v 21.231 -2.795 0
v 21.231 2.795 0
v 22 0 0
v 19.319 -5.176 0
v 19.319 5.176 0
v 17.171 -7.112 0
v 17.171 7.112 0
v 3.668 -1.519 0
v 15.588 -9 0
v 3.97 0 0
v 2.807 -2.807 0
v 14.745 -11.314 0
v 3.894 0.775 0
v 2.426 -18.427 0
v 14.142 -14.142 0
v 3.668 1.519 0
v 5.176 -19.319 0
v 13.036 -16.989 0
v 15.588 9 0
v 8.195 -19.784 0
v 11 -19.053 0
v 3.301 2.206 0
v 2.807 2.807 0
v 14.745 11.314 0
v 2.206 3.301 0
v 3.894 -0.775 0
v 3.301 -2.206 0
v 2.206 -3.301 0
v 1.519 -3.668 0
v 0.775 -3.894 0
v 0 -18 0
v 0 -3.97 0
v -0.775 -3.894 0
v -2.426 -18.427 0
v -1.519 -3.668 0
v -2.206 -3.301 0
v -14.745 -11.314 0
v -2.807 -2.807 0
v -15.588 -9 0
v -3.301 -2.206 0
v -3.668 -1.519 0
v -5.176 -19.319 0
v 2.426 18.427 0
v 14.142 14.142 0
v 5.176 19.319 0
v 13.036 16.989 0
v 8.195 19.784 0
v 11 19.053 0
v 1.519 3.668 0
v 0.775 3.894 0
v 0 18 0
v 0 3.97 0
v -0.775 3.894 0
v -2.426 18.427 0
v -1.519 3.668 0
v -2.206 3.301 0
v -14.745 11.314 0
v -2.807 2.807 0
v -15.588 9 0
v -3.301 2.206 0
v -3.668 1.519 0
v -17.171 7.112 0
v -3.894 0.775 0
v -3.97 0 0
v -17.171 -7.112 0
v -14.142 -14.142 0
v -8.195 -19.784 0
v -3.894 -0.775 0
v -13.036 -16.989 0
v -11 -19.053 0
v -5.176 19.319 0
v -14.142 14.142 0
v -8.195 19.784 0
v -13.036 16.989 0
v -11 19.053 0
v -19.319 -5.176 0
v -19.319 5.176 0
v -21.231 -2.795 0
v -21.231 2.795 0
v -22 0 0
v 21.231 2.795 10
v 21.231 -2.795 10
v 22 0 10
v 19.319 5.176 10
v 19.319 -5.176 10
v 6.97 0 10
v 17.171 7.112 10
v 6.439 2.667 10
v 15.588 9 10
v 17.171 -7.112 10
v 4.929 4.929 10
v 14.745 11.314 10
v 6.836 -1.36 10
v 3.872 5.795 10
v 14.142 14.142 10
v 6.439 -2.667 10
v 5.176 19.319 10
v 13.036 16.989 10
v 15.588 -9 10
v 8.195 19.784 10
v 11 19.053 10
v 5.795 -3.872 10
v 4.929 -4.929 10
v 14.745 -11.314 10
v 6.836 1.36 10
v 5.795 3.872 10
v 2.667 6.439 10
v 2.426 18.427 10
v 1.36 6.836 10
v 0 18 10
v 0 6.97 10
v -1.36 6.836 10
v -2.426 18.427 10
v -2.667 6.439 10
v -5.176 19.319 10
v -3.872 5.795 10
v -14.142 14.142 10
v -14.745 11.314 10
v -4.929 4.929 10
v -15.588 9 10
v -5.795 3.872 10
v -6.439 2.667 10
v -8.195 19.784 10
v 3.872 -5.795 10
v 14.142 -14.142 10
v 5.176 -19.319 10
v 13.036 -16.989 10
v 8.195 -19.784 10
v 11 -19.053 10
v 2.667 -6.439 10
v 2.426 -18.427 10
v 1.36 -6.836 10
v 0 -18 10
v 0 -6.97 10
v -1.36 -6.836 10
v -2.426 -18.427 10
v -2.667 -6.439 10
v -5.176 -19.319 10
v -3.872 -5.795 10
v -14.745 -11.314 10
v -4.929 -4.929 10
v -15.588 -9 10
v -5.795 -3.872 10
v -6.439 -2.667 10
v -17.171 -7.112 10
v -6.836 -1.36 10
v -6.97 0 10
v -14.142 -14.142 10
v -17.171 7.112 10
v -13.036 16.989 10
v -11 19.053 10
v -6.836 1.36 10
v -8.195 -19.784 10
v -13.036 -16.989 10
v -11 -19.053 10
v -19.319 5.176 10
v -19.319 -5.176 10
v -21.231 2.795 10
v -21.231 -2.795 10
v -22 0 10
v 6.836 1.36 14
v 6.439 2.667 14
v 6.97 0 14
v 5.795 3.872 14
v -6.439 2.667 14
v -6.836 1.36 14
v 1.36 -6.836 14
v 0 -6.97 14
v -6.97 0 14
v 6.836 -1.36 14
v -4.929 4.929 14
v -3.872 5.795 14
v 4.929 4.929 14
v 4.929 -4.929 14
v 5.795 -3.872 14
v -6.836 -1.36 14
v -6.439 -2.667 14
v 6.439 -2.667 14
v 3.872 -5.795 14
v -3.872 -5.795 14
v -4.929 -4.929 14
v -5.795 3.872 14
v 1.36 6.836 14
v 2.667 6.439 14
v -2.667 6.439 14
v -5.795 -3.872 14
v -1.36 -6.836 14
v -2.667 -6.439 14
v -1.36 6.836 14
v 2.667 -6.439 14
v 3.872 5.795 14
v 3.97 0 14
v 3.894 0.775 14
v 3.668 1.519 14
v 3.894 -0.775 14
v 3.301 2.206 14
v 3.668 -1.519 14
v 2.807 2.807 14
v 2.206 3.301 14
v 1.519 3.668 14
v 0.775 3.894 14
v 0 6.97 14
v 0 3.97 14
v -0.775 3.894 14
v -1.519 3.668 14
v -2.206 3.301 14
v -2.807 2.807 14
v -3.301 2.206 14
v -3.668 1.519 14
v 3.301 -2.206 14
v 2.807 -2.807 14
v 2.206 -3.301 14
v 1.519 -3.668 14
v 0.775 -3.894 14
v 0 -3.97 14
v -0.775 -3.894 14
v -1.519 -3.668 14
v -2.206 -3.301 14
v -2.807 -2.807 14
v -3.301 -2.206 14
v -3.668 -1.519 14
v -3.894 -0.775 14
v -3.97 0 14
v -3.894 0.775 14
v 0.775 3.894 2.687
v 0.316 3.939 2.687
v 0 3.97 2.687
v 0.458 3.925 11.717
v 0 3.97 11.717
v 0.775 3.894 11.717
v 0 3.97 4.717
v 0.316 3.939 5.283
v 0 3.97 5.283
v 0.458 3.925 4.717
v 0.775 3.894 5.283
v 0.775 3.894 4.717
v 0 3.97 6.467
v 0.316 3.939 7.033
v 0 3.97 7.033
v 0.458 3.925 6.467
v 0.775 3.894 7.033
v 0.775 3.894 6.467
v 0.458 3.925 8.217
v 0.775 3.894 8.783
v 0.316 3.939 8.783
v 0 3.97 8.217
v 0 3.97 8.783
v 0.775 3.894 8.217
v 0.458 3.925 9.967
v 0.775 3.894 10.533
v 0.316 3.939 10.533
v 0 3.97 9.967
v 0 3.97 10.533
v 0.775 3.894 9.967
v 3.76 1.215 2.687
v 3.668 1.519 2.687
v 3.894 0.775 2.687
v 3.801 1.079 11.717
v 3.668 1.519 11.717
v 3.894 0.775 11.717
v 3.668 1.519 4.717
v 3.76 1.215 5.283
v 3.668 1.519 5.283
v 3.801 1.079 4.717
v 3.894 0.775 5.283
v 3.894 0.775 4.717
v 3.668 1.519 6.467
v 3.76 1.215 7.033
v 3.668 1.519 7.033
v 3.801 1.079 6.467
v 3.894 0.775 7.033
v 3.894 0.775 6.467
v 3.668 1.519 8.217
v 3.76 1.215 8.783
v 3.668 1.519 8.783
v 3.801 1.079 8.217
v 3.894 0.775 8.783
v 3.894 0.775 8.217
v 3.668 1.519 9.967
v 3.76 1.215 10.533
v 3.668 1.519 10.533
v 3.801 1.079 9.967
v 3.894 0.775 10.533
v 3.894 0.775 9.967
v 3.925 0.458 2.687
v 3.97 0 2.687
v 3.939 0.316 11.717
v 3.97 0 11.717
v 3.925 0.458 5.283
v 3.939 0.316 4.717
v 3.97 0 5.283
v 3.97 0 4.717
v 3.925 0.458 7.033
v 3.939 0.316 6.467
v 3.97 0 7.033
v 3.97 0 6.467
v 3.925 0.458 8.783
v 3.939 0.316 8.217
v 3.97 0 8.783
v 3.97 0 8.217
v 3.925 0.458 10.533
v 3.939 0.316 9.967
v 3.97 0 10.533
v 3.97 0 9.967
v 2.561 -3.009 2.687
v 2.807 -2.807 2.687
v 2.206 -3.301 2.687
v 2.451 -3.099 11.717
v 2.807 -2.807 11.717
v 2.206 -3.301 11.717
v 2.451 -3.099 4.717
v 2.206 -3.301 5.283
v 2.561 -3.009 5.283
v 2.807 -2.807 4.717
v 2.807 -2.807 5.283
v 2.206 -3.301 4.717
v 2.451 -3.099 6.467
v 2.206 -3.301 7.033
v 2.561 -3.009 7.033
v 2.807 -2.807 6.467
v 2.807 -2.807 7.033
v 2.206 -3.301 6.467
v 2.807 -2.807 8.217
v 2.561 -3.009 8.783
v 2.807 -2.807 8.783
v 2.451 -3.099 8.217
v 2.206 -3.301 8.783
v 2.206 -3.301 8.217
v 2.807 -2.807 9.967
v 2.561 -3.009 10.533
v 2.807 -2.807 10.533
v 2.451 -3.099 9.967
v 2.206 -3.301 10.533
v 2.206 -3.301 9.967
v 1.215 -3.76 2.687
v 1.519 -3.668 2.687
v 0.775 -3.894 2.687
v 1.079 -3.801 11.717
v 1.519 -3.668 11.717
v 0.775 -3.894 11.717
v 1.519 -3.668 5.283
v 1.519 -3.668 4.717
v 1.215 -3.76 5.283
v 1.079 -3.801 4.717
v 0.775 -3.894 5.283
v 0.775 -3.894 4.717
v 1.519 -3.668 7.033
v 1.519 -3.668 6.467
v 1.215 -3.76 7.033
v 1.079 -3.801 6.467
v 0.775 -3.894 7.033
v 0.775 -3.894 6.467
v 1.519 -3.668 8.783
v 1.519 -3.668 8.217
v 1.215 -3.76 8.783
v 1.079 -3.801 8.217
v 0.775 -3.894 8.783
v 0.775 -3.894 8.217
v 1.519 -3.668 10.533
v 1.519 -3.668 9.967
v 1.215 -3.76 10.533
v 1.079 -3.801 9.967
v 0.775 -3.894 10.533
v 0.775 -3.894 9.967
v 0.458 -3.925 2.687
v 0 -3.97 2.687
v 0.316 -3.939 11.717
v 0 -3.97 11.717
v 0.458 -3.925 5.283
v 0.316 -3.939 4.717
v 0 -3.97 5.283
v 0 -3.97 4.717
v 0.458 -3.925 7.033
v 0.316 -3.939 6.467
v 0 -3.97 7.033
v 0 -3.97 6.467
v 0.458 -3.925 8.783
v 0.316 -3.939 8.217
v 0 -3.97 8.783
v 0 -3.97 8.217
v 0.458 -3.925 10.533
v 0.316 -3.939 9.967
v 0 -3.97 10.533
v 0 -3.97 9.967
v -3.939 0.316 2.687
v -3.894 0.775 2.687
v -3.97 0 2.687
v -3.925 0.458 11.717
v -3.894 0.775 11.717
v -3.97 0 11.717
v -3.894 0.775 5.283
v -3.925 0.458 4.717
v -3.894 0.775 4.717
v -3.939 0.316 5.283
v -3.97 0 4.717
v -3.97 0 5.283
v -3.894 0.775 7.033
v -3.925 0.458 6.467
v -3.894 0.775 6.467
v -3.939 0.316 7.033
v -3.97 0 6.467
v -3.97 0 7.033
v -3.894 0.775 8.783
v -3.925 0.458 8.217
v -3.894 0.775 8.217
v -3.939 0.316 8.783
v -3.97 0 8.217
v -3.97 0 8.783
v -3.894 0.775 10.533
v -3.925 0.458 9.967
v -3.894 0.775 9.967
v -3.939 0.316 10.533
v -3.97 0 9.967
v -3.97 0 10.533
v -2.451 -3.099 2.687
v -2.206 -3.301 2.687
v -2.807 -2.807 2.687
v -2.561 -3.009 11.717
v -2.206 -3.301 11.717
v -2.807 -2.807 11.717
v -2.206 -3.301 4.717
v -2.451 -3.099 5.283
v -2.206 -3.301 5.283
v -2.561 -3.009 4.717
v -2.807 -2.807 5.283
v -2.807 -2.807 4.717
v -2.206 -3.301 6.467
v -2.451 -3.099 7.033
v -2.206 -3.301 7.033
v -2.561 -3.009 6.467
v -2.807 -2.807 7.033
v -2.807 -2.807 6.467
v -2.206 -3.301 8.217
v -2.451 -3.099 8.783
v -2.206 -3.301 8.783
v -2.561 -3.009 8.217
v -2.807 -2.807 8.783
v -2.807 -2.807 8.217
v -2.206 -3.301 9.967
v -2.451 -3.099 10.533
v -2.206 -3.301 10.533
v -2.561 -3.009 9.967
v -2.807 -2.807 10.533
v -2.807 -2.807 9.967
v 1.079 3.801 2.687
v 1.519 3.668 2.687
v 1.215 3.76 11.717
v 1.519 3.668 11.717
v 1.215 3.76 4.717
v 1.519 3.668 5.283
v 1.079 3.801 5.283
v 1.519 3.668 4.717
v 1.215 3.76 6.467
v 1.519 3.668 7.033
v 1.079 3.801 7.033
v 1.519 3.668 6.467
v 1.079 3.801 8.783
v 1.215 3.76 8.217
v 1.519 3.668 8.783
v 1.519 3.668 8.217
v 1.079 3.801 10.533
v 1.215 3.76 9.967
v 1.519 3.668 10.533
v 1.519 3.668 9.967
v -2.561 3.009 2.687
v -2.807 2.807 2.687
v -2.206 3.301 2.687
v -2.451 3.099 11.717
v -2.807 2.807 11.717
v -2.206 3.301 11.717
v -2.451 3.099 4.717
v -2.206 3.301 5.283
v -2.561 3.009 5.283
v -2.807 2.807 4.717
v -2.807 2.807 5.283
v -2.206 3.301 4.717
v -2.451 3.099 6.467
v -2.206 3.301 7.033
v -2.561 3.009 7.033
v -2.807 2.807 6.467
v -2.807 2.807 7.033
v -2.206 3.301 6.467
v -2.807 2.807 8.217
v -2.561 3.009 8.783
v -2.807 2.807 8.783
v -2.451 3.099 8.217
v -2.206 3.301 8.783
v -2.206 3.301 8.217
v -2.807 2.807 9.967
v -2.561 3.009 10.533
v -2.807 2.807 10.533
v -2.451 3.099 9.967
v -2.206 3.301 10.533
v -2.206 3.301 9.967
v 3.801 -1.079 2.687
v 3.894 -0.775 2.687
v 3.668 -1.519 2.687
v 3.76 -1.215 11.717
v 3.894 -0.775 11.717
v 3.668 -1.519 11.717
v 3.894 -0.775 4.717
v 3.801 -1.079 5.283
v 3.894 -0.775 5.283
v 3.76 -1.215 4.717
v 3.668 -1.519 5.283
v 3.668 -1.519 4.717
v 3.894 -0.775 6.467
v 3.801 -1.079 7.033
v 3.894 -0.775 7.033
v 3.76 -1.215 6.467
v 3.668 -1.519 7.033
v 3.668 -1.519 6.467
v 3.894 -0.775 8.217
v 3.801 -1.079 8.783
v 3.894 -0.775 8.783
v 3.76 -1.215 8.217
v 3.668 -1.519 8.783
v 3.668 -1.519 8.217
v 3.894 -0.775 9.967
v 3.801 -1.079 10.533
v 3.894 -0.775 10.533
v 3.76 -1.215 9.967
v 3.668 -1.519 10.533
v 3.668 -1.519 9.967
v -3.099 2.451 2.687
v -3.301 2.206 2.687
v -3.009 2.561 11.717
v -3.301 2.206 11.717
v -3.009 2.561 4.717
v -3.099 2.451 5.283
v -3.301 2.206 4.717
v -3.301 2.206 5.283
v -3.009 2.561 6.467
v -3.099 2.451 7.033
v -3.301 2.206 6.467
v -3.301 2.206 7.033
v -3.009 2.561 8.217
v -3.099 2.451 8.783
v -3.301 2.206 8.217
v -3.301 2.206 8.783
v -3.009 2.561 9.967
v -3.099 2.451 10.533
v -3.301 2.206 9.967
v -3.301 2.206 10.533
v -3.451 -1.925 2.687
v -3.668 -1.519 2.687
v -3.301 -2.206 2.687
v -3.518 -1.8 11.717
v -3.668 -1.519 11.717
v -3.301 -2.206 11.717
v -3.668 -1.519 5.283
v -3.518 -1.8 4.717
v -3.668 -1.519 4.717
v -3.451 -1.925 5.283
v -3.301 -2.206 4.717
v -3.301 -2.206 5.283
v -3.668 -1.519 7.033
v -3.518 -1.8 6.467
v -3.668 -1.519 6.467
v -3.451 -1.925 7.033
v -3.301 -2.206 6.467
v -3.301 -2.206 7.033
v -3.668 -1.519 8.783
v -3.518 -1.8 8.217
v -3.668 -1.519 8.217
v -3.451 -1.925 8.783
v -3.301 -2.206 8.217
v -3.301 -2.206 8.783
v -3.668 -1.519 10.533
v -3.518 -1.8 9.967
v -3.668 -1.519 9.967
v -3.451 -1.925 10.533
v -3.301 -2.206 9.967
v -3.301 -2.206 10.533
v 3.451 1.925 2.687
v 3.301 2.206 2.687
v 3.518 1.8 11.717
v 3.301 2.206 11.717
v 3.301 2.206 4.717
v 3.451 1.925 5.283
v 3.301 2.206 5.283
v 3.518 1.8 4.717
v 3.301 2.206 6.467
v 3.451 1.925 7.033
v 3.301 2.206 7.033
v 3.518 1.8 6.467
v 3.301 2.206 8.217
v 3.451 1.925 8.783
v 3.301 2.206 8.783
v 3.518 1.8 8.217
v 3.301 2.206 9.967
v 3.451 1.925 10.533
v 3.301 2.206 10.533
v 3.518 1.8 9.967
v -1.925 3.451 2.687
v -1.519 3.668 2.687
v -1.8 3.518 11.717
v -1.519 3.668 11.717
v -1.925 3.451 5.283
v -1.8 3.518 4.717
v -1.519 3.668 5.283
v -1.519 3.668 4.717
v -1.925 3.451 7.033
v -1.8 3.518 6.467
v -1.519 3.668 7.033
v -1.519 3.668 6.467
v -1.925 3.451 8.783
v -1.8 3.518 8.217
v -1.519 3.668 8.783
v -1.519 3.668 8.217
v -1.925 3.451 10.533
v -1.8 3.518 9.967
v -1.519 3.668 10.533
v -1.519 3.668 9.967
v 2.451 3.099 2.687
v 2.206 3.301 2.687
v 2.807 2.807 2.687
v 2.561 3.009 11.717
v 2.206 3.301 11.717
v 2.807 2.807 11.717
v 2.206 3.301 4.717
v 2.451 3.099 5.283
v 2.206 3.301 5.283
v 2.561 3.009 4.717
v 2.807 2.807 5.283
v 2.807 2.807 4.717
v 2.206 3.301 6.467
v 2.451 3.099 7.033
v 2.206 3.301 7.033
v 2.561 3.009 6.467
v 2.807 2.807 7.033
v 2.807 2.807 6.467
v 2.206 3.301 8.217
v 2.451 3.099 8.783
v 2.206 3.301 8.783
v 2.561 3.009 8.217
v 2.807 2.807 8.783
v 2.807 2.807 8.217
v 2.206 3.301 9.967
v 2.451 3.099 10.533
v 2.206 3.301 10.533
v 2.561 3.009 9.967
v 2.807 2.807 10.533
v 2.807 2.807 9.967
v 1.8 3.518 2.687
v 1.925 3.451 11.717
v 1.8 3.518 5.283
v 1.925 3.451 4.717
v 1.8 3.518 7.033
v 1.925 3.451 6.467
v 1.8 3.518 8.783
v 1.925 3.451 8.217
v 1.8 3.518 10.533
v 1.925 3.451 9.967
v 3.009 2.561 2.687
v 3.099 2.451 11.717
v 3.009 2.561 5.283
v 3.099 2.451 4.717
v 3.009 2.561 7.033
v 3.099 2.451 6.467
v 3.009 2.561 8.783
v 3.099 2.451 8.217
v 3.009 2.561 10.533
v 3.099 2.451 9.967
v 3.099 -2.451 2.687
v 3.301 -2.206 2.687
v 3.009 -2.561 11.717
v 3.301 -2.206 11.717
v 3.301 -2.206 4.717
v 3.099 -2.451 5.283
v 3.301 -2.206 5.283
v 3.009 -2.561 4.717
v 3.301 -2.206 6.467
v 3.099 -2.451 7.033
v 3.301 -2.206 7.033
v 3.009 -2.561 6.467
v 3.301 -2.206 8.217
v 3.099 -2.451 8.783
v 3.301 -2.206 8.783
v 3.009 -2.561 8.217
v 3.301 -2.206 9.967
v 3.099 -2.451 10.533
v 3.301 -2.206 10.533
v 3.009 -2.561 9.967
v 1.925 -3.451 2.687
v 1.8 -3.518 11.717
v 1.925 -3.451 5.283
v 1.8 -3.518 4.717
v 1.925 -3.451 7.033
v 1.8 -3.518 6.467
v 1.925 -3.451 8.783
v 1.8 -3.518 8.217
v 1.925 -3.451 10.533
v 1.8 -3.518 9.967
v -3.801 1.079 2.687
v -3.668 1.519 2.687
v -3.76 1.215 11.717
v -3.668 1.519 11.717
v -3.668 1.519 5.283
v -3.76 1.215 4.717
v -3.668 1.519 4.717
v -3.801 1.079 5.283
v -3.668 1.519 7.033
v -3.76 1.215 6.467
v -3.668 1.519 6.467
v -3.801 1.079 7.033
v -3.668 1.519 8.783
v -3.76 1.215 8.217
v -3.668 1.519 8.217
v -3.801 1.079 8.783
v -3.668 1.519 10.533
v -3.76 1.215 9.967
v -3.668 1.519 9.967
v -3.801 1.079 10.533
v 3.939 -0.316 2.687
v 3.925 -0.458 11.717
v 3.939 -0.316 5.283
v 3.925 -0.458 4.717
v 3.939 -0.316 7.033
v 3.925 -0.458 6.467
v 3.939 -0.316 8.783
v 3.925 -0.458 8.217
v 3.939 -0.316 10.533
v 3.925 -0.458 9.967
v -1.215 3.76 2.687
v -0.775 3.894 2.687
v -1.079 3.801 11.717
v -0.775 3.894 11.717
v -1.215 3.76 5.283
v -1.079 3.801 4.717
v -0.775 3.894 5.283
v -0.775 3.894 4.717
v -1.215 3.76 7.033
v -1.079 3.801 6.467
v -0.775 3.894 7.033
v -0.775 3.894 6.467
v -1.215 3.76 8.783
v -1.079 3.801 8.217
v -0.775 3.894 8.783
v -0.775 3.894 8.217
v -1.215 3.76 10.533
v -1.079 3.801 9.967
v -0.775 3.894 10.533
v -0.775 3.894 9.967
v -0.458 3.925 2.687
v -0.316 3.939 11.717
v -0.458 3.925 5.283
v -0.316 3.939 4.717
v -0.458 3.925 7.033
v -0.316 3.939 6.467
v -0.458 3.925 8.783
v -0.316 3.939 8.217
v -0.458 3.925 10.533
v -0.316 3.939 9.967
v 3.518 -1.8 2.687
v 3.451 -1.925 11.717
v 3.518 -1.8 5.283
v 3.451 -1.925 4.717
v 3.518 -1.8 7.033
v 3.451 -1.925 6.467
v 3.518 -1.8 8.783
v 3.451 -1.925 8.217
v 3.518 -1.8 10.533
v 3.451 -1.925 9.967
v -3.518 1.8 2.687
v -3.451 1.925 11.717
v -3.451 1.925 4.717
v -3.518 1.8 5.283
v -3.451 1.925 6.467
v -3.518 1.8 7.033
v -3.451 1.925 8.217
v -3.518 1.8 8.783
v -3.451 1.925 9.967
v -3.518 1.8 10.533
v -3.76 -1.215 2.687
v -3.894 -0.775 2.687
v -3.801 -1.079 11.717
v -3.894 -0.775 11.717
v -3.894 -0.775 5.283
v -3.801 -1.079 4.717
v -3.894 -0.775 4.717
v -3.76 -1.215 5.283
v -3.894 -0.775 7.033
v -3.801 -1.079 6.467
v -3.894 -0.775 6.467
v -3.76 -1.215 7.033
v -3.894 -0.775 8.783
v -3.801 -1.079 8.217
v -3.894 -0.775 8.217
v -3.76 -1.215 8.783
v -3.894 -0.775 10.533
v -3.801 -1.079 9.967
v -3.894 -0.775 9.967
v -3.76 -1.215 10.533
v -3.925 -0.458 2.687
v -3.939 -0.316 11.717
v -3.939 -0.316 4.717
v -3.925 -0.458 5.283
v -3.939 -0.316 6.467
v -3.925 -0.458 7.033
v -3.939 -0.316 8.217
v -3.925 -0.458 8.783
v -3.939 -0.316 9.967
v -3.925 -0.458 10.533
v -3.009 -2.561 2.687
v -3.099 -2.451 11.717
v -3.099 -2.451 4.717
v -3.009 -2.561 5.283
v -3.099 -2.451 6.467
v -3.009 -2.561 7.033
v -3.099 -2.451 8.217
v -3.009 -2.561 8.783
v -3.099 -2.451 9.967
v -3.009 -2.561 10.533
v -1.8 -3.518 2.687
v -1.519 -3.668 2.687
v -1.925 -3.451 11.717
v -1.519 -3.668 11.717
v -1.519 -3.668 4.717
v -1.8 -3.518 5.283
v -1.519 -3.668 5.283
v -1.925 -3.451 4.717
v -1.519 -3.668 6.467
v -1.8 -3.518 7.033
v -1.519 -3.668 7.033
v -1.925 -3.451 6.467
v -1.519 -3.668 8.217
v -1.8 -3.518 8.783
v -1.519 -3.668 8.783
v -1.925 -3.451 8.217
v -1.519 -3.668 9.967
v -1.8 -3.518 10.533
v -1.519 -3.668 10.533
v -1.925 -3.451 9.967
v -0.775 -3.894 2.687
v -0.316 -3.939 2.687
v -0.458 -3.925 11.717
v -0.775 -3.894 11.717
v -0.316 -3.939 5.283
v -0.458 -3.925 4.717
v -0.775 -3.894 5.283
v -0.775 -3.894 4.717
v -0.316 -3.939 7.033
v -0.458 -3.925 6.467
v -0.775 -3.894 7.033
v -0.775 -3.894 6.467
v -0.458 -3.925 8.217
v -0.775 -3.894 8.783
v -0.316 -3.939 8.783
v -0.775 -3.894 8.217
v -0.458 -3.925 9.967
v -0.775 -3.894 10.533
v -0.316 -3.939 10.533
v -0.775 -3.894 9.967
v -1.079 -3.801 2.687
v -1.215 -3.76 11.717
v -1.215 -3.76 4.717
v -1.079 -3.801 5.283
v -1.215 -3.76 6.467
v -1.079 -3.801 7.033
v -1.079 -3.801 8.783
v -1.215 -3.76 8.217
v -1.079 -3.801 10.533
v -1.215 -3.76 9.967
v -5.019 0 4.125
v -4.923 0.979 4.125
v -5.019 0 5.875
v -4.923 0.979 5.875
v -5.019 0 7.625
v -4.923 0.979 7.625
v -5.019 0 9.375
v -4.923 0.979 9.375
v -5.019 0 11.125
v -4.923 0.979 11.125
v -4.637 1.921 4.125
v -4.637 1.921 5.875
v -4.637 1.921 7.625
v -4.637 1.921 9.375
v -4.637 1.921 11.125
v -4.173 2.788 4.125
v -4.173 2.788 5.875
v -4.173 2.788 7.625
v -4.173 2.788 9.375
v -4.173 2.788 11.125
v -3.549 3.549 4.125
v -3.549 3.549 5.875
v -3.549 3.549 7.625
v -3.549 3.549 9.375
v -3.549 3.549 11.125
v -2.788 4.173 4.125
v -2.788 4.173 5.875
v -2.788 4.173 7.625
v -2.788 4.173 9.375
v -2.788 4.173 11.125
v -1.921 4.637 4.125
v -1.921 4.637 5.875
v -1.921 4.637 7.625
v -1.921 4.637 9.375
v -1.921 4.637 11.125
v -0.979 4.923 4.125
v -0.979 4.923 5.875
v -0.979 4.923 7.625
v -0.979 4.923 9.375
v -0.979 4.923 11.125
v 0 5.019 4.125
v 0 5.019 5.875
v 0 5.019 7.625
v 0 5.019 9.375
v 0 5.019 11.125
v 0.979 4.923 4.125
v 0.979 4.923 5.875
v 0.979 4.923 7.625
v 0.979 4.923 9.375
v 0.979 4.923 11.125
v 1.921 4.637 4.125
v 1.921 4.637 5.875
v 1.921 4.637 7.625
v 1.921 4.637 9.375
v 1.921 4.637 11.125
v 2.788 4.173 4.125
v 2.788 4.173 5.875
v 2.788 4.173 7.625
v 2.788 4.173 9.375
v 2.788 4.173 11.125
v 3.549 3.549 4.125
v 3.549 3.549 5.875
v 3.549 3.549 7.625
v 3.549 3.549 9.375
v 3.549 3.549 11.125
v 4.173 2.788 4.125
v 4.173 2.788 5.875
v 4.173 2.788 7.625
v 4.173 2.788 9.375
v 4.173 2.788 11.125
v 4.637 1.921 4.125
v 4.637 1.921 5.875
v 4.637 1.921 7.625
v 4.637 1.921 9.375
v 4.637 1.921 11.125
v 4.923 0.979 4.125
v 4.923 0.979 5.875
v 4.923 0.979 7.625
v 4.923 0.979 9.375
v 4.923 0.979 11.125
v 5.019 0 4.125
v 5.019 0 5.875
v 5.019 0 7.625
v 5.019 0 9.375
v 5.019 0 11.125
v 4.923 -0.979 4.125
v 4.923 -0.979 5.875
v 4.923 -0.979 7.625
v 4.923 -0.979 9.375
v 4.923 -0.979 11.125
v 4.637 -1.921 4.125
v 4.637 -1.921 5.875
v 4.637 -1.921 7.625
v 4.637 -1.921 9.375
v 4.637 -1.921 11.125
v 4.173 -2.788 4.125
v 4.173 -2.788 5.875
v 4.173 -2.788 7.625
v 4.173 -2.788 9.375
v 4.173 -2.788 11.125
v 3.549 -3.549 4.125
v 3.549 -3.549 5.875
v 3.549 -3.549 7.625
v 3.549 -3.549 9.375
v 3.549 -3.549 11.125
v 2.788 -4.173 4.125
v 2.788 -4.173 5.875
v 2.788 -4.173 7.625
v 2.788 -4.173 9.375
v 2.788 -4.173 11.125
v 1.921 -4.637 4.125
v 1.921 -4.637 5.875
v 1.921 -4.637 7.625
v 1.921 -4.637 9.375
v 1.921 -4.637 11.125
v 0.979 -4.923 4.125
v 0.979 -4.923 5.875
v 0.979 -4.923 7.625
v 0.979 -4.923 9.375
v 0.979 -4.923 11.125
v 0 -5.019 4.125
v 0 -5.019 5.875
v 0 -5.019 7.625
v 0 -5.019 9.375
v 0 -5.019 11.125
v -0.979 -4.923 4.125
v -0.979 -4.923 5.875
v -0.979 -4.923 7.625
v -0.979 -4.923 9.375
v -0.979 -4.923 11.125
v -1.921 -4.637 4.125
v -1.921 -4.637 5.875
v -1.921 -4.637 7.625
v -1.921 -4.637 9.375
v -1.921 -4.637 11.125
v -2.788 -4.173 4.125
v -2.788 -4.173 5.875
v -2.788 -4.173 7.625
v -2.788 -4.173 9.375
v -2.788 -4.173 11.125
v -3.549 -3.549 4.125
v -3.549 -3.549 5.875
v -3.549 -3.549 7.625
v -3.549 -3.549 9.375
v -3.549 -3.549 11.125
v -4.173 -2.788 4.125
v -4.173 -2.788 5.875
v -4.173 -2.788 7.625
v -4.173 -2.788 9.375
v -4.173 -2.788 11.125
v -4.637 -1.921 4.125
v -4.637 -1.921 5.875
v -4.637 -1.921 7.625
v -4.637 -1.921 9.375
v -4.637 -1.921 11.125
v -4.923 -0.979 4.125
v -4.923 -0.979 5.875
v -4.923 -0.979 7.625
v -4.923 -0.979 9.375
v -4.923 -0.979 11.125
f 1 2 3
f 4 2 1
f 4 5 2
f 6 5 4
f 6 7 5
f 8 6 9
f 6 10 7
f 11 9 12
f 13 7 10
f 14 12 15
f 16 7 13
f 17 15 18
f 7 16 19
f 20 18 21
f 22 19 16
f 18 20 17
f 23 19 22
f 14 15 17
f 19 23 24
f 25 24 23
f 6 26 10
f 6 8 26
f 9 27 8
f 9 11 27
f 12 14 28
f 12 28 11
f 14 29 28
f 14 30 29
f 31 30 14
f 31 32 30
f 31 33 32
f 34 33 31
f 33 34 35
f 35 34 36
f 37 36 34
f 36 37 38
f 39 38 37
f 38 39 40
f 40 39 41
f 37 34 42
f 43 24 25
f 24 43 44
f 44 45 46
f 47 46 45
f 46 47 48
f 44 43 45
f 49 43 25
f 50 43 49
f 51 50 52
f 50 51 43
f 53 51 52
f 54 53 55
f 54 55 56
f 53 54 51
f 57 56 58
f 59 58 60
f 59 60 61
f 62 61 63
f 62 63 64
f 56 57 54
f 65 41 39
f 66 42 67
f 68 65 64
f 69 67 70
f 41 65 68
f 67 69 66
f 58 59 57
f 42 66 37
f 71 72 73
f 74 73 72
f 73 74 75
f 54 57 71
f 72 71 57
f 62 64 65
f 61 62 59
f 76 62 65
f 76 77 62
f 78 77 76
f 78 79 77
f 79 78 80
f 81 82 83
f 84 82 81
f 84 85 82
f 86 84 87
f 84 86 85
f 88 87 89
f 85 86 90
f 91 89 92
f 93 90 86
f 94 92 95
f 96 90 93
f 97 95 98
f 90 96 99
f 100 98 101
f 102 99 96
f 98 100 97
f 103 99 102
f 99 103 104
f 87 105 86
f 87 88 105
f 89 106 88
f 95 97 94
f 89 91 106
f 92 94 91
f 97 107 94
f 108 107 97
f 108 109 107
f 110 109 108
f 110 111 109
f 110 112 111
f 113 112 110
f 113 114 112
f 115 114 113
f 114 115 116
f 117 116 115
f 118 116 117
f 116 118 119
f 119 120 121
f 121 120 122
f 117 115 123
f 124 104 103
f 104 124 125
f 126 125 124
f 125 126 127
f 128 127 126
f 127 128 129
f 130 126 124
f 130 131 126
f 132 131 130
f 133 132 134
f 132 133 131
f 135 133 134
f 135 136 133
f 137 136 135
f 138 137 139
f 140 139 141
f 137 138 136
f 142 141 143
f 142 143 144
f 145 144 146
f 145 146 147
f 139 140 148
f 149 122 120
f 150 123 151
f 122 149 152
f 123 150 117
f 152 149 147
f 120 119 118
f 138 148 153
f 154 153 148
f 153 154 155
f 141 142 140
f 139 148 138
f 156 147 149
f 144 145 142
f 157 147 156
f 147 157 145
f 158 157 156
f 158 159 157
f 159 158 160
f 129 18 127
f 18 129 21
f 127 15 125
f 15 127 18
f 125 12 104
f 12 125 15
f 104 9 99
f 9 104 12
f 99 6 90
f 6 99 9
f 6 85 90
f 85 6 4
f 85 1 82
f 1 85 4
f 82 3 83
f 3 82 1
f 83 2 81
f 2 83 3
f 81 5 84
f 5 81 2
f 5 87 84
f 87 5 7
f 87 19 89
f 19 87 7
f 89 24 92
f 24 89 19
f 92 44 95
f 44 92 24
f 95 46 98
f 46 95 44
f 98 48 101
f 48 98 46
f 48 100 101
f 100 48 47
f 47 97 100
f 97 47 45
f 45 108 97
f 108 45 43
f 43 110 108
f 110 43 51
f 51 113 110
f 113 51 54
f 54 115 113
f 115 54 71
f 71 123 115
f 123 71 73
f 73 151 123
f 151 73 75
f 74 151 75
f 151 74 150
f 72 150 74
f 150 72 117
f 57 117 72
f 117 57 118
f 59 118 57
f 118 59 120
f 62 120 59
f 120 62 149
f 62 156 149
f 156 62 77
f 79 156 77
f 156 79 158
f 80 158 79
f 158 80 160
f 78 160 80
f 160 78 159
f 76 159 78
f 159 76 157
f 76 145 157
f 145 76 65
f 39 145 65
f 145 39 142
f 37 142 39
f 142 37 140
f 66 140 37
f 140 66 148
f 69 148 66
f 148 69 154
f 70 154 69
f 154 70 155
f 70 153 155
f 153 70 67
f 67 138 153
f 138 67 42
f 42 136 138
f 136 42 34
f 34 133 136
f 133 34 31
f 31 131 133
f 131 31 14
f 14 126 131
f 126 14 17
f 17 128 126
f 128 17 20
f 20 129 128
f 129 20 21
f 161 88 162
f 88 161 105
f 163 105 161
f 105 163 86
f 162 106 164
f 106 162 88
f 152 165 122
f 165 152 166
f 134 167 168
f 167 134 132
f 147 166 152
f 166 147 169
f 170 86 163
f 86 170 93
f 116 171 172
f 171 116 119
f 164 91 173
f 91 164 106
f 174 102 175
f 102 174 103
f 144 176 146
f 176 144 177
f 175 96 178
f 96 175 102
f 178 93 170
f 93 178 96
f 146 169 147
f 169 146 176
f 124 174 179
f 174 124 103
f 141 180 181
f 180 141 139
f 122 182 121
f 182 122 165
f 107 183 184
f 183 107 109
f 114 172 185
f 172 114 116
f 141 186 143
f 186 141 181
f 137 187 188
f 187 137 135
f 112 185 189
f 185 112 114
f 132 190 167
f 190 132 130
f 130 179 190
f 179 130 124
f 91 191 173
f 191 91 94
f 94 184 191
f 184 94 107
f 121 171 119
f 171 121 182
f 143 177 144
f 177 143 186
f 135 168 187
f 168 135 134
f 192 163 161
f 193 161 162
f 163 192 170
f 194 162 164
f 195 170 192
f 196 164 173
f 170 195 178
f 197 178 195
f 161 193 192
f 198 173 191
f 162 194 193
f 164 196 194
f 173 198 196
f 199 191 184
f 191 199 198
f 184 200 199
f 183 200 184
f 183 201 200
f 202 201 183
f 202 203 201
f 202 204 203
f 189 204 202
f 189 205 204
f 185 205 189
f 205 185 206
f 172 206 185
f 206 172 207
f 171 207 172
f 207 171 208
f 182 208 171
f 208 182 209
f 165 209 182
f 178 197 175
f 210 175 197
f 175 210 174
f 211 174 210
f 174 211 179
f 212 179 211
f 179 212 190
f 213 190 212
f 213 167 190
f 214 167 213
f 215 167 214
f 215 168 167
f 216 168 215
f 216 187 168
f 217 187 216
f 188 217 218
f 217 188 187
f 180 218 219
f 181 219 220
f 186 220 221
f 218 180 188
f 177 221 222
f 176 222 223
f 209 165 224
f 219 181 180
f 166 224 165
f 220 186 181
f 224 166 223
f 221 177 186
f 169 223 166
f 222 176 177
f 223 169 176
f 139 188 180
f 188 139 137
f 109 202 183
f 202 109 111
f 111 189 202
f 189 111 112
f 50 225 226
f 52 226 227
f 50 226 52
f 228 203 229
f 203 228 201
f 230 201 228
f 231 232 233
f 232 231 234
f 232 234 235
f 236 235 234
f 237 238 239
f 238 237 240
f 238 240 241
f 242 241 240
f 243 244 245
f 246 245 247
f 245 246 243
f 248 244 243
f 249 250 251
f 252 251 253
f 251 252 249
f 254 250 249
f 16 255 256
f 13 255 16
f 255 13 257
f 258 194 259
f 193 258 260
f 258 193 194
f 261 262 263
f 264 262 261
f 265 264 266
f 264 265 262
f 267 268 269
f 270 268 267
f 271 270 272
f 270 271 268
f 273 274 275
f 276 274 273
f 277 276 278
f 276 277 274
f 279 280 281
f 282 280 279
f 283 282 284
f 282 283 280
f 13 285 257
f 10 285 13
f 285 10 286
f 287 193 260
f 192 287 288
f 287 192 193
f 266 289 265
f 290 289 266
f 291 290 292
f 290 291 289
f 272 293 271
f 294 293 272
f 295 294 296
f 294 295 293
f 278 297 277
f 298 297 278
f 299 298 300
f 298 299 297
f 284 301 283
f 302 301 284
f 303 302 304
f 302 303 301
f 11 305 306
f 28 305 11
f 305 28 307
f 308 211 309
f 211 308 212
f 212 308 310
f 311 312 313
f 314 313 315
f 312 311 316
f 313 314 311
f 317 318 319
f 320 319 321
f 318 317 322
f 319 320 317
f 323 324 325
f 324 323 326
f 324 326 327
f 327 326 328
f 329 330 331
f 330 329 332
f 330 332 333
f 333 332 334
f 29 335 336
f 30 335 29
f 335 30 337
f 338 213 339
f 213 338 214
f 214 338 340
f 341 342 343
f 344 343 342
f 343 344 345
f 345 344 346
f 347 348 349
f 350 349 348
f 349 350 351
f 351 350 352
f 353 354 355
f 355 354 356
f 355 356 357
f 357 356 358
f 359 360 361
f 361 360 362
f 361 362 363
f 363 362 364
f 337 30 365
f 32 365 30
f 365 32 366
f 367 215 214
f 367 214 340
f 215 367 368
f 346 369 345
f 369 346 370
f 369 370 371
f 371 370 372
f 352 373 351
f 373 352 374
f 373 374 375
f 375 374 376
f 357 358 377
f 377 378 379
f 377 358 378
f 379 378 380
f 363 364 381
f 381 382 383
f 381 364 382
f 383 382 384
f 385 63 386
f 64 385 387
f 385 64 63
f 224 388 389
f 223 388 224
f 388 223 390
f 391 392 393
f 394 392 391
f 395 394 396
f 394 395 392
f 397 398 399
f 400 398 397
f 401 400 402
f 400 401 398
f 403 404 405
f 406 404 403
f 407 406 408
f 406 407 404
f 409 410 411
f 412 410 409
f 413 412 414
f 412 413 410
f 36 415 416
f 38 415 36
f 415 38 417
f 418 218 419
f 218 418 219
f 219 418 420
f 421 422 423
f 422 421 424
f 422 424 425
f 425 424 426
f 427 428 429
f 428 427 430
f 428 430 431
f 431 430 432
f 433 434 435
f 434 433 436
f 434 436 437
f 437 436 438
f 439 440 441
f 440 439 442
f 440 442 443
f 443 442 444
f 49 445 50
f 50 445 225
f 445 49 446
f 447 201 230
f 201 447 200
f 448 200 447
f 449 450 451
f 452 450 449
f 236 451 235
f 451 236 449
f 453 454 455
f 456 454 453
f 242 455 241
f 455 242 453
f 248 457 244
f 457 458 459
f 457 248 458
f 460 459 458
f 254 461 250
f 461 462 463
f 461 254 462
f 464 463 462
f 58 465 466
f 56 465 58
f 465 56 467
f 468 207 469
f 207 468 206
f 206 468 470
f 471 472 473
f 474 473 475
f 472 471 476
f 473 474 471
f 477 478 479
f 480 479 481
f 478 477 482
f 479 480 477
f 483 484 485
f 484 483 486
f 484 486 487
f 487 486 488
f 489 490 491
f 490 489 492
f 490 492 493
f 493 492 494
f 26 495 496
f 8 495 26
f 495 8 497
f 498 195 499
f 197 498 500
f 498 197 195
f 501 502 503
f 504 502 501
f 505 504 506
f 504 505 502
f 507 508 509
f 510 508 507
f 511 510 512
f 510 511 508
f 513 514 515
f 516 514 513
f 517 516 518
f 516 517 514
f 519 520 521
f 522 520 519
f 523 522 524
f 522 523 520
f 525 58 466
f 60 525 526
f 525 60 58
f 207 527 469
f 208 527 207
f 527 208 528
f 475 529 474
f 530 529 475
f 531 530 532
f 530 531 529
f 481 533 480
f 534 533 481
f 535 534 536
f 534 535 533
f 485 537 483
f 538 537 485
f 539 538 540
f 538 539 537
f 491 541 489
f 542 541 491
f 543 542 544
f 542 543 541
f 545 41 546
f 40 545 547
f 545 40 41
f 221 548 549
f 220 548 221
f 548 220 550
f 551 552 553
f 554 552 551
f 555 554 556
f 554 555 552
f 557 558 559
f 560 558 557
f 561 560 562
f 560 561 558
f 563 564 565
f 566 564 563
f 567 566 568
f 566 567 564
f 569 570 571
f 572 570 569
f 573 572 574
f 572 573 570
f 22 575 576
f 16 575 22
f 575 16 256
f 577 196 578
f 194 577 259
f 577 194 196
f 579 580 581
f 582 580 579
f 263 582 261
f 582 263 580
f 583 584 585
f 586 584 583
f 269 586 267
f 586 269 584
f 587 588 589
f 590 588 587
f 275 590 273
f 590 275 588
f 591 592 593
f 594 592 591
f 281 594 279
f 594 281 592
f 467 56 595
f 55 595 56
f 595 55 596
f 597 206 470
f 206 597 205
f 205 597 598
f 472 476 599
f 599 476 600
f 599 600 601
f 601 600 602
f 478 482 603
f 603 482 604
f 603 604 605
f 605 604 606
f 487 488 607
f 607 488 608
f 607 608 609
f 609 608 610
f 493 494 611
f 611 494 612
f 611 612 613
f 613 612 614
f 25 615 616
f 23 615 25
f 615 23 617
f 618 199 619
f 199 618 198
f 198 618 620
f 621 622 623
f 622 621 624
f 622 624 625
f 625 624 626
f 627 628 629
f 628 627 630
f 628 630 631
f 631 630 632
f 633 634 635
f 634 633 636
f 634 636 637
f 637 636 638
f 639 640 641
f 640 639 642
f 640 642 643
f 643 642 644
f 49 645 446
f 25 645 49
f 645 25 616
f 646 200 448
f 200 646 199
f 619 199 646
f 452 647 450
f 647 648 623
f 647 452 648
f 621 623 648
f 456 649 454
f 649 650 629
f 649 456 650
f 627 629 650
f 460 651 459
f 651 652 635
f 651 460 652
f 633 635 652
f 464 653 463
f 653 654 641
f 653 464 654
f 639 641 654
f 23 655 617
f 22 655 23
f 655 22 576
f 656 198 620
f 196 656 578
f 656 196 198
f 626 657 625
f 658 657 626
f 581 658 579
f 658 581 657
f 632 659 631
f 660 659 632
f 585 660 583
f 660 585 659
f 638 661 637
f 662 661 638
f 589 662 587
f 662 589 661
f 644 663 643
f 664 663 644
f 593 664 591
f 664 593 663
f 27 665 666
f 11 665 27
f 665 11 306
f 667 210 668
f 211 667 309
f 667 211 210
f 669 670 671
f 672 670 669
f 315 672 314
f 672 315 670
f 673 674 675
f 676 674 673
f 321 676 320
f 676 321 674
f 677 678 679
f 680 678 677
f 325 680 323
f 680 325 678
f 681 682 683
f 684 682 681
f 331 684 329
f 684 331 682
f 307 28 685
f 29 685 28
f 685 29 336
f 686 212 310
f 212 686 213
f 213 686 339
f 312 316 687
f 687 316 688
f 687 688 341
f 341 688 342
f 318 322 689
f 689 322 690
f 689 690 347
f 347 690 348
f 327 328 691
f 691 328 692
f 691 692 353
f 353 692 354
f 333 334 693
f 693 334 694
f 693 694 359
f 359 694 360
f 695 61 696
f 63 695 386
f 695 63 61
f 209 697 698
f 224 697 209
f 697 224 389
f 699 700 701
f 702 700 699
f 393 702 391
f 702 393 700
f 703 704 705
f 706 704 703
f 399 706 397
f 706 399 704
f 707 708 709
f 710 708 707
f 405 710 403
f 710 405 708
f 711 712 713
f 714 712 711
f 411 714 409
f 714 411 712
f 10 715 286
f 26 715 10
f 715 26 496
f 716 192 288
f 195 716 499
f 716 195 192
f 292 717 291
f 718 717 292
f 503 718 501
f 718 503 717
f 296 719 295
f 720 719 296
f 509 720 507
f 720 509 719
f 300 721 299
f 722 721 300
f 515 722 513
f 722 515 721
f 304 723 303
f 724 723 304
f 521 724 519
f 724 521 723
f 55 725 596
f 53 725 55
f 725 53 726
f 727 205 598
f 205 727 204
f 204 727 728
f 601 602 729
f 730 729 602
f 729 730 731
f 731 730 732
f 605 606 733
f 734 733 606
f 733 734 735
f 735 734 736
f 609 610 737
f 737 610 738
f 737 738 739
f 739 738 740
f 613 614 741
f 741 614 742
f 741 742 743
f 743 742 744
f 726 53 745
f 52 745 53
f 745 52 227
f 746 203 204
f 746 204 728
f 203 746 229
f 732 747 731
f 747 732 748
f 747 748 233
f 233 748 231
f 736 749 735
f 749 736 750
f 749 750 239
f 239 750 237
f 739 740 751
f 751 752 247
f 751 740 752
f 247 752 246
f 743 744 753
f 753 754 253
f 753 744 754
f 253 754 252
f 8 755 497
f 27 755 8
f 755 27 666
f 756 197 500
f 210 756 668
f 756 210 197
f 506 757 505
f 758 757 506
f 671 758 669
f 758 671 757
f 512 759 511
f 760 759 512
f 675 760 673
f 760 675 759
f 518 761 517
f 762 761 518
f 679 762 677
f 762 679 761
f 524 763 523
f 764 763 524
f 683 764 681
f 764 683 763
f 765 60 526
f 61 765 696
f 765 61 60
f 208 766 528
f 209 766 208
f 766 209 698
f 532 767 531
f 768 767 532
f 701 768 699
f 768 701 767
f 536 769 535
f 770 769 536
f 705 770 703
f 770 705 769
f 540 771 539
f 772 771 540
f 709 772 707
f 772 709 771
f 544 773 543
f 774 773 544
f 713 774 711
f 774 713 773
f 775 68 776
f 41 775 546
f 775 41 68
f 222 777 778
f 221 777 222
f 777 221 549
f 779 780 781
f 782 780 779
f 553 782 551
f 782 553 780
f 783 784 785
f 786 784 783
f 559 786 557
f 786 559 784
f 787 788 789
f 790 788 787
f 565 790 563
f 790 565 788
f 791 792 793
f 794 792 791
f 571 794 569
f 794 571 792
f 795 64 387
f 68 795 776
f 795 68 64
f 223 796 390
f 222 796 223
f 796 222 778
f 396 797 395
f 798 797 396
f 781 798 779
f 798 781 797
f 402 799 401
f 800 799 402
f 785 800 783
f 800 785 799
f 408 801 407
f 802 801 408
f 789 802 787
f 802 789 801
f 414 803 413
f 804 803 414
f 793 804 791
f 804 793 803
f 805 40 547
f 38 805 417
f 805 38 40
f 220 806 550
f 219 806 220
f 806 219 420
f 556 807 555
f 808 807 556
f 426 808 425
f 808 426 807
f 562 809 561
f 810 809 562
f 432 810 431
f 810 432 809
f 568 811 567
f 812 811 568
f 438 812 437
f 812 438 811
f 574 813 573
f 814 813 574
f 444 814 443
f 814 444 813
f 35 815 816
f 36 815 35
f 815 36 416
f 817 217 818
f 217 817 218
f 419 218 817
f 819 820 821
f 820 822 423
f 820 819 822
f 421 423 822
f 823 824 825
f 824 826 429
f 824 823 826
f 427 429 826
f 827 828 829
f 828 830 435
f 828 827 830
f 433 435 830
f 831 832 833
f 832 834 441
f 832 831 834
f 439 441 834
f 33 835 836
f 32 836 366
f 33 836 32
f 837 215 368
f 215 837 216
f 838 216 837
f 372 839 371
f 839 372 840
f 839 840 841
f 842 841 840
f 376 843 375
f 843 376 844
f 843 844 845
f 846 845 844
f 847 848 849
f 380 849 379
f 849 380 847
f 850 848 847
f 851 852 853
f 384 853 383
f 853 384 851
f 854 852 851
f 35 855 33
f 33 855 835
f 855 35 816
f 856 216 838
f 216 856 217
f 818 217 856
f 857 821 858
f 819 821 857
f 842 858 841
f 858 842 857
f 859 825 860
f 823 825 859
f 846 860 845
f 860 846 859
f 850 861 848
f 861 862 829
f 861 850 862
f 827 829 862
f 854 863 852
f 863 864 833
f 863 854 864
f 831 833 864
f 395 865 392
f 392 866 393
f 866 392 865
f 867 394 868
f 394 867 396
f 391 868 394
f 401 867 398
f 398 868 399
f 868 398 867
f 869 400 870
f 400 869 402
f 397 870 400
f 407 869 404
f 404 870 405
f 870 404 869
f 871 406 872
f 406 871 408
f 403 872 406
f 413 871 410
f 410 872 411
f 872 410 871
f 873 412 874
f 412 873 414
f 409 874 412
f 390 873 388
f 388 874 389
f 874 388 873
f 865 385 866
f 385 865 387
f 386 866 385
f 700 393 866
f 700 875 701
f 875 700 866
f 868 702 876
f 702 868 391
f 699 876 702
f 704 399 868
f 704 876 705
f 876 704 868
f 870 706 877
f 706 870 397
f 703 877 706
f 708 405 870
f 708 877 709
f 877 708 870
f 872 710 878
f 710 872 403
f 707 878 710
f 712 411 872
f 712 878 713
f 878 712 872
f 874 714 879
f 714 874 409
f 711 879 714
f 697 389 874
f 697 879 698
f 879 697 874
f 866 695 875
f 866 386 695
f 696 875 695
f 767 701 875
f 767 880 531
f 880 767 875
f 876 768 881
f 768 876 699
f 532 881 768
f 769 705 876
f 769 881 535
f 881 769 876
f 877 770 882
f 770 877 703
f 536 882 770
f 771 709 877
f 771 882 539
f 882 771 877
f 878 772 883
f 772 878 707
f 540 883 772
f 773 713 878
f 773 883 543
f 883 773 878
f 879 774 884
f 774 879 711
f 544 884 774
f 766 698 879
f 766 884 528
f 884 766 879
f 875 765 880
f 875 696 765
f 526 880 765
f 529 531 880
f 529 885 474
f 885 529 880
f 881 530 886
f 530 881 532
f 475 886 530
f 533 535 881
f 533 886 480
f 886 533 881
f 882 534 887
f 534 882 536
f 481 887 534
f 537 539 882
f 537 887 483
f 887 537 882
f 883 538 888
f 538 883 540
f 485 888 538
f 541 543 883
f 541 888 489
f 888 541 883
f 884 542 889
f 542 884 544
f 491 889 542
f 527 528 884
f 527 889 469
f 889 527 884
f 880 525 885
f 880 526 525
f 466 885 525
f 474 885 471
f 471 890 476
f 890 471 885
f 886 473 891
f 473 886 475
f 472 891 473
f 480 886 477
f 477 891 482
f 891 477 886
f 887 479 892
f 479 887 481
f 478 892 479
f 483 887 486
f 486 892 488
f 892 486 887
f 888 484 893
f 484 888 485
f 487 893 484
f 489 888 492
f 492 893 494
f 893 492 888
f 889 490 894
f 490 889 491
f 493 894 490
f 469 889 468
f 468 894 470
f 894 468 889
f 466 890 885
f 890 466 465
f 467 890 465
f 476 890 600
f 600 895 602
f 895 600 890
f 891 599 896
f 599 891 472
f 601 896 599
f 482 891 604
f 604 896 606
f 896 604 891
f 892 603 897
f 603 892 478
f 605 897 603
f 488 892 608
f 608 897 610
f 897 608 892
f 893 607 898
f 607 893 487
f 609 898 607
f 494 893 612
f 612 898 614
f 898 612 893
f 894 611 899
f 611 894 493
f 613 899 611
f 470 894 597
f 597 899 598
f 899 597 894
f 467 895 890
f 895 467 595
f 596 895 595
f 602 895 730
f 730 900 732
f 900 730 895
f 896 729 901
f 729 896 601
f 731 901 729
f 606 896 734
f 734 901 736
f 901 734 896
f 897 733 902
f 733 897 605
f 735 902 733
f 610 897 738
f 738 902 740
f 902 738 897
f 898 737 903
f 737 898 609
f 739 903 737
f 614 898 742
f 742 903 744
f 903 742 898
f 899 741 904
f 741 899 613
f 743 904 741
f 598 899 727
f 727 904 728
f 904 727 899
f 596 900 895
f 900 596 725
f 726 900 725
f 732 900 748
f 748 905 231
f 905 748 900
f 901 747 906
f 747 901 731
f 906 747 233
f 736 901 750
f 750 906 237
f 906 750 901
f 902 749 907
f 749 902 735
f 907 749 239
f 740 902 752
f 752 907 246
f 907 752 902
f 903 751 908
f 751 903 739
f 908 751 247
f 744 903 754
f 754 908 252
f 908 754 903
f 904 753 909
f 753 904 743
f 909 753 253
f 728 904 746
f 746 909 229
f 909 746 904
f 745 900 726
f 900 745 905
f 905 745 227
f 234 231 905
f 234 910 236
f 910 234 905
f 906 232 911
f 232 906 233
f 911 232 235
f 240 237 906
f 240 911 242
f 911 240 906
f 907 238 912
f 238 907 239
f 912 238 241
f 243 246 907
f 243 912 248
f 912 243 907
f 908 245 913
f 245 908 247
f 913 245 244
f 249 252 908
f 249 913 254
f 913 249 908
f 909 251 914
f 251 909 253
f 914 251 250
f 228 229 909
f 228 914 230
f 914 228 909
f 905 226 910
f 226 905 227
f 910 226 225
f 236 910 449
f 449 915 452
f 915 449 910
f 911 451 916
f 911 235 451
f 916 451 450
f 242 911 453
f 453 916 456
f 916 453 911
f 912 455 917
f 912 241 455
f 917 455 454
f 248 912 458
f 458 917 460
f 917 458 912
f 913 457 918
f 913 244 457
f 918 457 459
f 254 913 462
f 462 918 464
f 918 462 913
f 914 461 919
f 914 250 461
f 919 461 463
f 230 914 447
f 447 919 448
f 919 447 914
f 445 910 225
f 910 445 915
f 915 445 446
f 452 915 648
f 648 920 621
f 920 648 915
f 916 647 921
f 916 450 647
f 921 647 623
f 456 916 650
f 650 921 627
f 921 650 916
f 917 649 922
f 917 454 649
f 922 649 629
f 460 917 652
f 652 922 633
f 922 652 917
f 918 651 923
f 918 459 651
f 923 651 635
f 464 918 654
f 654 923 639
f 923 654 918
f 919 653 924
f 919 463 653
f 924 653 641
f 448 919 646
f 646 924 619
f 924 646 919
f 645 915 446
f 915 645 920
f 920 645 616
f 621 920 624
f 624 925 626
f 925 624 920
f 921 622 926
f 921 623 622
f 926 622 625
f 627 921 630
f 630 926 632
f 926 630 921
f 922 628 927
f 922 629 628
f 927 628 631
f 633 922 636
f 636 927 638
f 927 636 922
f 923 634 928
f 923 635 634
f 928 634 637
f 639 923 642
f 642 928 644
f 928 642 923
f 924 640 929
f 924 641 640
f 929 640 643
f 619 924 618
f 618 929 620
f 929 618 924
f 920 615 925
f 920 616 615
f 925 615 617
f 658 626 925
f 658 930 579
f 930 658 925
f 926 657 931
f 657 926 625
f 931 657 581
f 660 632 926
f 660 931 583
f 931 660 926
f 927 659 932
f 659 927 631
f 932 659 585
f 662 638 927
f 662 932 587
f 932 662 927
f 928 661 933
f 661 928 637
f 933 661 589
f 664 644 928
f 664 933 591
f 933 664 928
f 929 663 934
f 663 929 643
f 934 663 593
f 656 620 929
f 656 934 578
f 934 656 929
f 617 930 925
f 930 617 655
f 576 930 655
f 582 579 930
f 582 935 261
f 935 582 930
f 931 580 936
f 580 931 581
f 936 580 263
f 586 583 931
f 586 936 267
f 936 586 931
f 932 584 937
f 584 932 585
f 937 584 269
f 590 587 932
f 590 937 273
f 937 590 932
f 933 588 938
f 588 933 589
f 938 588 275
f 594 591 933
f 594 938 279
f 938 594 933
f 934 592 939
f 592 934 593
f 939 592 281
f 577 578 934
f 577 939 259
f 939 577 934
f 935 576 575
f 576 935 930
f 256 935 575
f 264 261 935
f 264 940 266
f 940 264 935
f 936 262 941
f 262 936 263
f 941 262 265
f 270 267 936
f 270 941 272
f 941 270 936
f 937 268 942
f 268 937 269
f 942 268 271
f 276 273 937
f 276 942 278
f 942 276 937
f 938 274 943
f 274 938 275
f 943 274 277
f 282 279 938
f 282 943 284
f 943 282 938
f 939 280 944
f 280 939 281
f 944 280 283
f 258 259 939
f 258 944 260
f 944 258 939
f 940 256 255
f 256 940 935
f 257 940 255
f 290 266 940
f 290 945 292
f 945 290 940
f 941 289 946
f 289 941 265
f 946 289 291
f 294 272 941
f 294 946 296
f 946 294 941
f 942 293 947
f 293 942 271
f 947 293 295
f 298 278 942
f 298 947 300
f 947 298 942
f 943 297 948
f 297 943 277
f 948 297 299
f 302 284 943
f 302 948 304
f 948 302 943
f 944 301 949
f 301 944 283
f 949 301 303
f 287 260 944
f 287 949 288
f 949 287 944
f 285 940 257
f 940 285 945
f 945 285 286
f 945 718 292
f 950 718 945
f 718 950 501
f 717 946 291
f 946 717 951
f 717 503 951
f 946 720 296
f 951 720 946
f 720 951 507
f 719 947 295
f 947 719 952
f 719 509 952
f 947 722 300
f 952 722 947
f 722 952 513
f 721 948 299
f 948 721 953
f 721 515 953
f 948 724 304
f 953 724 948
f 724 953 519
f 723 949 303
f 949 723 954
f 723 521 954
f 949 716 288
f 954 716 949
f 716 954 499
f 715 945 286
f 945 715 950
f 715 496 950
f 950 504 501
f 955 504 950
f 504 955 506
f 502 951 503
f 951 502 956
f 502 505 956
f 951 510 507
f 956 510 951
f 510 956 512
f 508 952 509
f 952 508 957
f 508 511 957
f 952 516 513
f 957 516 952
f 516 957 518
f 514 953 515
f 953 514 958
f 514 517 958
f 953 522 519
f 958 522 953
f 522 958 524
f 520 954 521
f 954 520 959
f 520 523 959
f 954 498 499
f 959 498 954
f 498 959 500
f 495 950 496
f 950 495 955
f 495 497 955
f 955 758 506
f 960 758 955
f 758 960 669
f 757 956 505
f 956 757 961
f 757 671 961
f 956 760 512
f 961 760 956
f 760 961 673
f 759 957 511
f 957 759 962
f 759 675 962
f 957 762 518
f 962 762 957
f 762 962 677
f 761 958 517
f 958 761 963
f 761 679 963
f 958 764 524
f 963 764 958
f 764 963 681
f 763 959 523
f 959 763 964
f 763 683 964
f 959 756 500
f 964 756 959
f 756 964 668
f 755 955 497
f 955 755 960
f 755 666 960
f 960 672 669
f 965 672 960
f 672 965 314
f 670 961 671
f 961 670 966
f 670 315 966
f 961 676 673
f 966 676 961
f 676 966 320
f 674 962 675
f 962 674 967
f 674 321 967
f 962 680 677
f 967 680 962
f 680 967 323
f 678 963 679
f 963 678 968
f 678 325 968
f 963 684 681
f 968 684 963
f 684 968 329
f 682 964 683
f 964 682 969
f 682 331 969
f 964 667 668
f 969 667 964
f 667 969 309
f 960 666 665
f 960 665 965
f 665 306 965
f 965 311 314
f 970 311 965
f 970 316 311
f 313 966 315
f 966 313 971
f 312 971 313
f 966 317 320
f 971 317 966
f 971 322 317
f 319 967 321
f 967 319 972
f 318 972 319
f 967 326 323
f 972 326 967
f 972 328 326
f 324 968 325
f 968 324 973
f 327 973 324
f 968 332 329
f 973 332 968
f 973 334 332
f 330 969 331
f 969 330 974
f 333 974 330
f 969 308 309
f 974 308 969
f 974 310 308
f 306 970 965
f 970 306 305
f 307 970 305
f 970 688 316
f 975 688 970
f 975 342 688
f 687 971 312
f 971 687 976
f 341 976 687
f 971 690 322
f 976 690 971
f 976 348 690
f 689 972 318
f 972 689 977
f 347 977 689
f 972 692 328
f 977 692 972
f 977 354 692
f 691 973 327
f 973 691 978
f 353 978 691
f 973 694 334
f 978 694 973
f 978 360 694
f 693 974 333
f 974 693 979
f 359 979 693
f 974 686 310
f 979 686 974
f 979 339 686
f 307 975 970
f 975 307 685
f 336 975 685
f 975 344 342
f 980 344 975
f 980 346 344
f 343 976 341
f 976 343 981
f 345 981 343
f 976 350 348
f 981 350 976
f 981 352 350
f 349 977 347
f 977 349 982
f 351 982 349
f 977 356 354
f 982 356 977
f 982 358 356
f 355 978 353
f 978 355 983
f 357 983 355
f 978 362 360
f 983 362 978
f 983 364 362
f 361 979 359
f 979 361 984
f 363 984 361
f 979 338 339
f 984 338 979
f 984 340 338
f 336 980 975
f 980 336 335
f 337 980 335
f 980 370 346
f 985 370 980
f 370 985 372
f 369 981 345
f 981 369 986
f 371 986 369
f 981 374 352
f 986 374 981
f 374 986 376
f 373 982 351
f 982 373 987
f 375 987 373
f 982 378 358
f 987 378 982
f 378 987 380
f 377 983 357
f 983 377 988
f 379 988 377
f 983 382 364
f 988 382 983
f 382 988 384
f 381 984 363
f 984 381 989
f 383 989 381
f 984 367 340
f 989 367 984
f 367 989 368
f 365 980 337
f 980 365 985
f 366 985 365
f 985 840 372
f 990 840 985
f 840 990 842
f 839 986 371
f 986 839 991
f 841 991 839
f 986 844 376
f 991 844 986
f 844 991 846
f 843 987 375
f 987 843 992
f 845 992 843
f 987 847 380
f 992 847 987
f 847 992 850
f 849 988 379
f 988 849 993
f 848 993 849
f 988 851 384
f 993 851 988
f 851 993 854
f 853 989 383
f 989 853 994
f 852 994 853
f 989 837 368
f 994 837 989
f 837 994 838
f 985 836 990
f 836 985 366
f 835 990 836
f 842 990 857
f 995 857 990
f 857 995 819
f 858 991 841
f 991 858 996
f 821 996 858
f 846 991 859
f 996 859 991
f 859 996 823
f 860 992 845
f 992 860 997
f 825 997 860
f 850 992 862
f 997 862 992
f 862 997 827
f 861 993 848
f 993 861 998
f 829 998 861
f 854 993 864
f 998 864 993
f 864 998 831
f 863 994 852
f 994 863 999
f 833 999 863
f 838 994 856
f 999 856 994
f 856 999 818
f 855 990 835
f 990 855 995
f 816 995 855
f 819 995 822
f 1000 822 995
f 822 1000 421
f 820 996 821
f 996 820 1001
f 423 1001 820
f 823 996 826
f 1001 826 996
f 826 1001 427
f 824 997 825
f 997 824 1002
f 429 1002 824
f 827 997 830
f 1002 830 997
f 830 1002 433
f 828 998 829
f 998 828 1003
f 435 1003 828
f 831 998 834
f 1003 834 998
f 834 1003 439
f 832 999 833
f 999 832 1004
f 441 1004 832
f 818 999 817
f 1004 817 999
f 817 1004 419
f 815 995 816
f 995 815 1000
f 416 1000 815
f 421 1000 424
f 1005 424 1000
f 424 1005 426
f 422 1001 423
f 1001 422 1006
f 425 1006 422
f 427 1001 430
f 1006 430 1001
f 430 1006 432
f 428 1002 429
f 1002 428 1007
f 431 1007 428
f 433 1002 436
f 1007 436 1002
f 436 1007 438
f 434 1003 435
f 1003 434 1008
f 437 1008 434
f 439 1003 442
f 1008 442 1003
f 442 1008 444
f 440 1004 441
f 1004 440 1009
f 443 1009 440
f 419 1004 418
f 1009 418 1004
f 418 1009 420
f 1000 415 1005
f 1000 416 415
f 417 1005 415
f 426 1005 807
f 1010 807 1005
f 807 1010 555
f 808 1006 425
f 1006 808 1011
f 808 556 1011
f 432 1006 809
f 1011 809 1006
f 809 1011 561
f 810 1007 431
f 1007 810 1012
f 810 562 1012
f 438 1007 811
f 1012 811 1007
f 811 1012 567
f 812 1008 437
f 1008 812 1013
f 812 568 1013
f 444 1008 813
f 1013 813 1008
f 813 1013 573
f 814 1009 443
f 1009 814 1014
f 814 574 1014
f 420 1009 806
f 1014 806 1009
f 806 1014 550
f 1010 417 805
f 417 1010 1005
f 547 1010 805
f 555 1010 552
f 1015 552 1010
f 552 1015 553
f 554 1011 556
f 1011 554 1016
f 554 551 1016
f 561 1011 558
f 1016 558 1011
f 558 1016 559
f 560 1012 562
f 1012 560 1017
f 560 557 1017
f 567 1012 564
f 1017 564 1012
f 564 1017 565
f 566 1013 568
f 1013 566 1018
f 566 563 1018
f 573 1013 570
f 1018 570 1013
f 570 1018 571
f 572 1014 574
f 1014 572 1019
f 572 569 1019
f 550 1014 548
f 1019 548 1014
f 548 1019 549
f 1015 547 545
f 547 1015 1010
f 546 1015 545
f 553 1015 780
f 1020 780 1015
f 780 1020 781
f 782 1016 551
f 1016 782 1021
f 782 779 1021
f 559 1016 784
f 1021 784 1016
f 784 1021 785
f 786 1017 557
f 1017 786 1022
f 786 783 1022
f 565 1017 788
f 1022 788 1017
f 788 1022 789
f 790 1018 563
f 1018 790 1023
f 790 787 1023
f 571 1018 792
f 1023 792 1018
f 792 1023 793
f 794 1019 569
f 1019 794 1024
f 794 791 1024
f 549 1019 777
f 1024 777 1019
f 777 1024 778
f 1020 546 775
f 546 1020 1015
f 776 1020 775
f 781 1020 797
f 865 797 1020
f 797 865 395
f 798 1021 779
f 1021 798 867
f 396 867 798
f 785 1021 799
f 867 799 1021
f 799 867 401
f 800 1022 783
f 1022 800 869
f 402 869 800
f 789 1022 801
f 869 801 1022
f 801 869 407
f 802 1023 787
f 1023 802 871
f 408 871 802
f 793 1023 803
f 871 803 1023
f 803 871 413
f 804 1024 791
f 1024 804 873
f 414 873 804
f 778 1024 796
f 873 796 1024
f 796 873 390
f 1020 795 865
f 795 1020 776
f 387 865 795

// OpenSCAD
$fn = 32;

// ----------------------------------------------------------------------
// Thumb nut: 6 lobe grip, 14 mm tall, M7.94 thread
// ----------------------------------------------------------------------

// --- parameters (mm) ---
base_r = 20;              // grip base radius
lobe_amp = 2;             // lobe height above the base radius
lobes = 6;                // number of grip lobes
grip_h = 10;              // grip height
boss_d = 13.94;           // threaded boss diameter
boss_h = 4;               // boss height
bore_d = 7.94;            // thread core diameter
pitch = 1.75;             // thread pitch
thread_d = 1.05;          // thread depth

grip = [[22, 0], [21.231, 2.795], [19.319, 5.176], [17.171, 7.112], [15.588, 9], [14.745, 11.314], [14.142, 14.142], [13.036, 16.989], [11, 19.053], [8.195, 19.784], [5.176, 19.319], [2.426, 18.427], [0, 18], [-2.426, 18.427], [-5.176, 19.319], [-8.195, 19.784], [-11, 19.053], [-13.036, 16.989], [-14.142, 14.142], [-14.745, 11.314], [-15.588, 9], [-17.171, 7.112], [-19.319, 5.176], [-21.231, 2.795], [-22, 0], [-21.231, -2.795], [-19.319, -5.176], [-17.171, -7.112], [-15.588, -9], [-14.745, -11.314], [-14.142, -14.142], [-13.036, -16.989], [-11, -19.053], [-8.195, -19.784], [-5.176, -19.319], [-2.426, -18.427], [0, -18], [2.426, -18.427], [5.176, -19.319], [8.195, -19.784], [11, -19.053], [13.036, -16.989], [14.142, -14.142], [14.745, -11.314], [15.588, -9], [17.171, -7.112], [19.319, -5.176], [21.231, -2.795]];

difference() {
  union() {
    /* grip outline extruded straight up */
    linear_extrude(height = grip_h) polygon(grip);
    /* boss sunk half a millimetre into the grip */
    translate([0, 0, grip_h - 0.5]) cylinder(h = boss_h + 0.5, d = boss_d);
  }
  /* threaded bore through grip and boss */
  translate([0, 0, -2.5]) cylinder(h = grip_h + boss_h + 5, d = bore_d);
  translate([0, 0, 2.0]) rotate_extrude() polygon([[2.969, 0], [2.969, 10], [3.469, 10], [5.019, 9.125], [3.469, 8.25], [5.019, 7.375], [3.469, 6.5], [5.019, 5.625], [3.469, 4.75], [5.019, 3.875], [3.469, 3], [5.019, 2.125], [3.469, 0], [2.969, 0]]);
}
